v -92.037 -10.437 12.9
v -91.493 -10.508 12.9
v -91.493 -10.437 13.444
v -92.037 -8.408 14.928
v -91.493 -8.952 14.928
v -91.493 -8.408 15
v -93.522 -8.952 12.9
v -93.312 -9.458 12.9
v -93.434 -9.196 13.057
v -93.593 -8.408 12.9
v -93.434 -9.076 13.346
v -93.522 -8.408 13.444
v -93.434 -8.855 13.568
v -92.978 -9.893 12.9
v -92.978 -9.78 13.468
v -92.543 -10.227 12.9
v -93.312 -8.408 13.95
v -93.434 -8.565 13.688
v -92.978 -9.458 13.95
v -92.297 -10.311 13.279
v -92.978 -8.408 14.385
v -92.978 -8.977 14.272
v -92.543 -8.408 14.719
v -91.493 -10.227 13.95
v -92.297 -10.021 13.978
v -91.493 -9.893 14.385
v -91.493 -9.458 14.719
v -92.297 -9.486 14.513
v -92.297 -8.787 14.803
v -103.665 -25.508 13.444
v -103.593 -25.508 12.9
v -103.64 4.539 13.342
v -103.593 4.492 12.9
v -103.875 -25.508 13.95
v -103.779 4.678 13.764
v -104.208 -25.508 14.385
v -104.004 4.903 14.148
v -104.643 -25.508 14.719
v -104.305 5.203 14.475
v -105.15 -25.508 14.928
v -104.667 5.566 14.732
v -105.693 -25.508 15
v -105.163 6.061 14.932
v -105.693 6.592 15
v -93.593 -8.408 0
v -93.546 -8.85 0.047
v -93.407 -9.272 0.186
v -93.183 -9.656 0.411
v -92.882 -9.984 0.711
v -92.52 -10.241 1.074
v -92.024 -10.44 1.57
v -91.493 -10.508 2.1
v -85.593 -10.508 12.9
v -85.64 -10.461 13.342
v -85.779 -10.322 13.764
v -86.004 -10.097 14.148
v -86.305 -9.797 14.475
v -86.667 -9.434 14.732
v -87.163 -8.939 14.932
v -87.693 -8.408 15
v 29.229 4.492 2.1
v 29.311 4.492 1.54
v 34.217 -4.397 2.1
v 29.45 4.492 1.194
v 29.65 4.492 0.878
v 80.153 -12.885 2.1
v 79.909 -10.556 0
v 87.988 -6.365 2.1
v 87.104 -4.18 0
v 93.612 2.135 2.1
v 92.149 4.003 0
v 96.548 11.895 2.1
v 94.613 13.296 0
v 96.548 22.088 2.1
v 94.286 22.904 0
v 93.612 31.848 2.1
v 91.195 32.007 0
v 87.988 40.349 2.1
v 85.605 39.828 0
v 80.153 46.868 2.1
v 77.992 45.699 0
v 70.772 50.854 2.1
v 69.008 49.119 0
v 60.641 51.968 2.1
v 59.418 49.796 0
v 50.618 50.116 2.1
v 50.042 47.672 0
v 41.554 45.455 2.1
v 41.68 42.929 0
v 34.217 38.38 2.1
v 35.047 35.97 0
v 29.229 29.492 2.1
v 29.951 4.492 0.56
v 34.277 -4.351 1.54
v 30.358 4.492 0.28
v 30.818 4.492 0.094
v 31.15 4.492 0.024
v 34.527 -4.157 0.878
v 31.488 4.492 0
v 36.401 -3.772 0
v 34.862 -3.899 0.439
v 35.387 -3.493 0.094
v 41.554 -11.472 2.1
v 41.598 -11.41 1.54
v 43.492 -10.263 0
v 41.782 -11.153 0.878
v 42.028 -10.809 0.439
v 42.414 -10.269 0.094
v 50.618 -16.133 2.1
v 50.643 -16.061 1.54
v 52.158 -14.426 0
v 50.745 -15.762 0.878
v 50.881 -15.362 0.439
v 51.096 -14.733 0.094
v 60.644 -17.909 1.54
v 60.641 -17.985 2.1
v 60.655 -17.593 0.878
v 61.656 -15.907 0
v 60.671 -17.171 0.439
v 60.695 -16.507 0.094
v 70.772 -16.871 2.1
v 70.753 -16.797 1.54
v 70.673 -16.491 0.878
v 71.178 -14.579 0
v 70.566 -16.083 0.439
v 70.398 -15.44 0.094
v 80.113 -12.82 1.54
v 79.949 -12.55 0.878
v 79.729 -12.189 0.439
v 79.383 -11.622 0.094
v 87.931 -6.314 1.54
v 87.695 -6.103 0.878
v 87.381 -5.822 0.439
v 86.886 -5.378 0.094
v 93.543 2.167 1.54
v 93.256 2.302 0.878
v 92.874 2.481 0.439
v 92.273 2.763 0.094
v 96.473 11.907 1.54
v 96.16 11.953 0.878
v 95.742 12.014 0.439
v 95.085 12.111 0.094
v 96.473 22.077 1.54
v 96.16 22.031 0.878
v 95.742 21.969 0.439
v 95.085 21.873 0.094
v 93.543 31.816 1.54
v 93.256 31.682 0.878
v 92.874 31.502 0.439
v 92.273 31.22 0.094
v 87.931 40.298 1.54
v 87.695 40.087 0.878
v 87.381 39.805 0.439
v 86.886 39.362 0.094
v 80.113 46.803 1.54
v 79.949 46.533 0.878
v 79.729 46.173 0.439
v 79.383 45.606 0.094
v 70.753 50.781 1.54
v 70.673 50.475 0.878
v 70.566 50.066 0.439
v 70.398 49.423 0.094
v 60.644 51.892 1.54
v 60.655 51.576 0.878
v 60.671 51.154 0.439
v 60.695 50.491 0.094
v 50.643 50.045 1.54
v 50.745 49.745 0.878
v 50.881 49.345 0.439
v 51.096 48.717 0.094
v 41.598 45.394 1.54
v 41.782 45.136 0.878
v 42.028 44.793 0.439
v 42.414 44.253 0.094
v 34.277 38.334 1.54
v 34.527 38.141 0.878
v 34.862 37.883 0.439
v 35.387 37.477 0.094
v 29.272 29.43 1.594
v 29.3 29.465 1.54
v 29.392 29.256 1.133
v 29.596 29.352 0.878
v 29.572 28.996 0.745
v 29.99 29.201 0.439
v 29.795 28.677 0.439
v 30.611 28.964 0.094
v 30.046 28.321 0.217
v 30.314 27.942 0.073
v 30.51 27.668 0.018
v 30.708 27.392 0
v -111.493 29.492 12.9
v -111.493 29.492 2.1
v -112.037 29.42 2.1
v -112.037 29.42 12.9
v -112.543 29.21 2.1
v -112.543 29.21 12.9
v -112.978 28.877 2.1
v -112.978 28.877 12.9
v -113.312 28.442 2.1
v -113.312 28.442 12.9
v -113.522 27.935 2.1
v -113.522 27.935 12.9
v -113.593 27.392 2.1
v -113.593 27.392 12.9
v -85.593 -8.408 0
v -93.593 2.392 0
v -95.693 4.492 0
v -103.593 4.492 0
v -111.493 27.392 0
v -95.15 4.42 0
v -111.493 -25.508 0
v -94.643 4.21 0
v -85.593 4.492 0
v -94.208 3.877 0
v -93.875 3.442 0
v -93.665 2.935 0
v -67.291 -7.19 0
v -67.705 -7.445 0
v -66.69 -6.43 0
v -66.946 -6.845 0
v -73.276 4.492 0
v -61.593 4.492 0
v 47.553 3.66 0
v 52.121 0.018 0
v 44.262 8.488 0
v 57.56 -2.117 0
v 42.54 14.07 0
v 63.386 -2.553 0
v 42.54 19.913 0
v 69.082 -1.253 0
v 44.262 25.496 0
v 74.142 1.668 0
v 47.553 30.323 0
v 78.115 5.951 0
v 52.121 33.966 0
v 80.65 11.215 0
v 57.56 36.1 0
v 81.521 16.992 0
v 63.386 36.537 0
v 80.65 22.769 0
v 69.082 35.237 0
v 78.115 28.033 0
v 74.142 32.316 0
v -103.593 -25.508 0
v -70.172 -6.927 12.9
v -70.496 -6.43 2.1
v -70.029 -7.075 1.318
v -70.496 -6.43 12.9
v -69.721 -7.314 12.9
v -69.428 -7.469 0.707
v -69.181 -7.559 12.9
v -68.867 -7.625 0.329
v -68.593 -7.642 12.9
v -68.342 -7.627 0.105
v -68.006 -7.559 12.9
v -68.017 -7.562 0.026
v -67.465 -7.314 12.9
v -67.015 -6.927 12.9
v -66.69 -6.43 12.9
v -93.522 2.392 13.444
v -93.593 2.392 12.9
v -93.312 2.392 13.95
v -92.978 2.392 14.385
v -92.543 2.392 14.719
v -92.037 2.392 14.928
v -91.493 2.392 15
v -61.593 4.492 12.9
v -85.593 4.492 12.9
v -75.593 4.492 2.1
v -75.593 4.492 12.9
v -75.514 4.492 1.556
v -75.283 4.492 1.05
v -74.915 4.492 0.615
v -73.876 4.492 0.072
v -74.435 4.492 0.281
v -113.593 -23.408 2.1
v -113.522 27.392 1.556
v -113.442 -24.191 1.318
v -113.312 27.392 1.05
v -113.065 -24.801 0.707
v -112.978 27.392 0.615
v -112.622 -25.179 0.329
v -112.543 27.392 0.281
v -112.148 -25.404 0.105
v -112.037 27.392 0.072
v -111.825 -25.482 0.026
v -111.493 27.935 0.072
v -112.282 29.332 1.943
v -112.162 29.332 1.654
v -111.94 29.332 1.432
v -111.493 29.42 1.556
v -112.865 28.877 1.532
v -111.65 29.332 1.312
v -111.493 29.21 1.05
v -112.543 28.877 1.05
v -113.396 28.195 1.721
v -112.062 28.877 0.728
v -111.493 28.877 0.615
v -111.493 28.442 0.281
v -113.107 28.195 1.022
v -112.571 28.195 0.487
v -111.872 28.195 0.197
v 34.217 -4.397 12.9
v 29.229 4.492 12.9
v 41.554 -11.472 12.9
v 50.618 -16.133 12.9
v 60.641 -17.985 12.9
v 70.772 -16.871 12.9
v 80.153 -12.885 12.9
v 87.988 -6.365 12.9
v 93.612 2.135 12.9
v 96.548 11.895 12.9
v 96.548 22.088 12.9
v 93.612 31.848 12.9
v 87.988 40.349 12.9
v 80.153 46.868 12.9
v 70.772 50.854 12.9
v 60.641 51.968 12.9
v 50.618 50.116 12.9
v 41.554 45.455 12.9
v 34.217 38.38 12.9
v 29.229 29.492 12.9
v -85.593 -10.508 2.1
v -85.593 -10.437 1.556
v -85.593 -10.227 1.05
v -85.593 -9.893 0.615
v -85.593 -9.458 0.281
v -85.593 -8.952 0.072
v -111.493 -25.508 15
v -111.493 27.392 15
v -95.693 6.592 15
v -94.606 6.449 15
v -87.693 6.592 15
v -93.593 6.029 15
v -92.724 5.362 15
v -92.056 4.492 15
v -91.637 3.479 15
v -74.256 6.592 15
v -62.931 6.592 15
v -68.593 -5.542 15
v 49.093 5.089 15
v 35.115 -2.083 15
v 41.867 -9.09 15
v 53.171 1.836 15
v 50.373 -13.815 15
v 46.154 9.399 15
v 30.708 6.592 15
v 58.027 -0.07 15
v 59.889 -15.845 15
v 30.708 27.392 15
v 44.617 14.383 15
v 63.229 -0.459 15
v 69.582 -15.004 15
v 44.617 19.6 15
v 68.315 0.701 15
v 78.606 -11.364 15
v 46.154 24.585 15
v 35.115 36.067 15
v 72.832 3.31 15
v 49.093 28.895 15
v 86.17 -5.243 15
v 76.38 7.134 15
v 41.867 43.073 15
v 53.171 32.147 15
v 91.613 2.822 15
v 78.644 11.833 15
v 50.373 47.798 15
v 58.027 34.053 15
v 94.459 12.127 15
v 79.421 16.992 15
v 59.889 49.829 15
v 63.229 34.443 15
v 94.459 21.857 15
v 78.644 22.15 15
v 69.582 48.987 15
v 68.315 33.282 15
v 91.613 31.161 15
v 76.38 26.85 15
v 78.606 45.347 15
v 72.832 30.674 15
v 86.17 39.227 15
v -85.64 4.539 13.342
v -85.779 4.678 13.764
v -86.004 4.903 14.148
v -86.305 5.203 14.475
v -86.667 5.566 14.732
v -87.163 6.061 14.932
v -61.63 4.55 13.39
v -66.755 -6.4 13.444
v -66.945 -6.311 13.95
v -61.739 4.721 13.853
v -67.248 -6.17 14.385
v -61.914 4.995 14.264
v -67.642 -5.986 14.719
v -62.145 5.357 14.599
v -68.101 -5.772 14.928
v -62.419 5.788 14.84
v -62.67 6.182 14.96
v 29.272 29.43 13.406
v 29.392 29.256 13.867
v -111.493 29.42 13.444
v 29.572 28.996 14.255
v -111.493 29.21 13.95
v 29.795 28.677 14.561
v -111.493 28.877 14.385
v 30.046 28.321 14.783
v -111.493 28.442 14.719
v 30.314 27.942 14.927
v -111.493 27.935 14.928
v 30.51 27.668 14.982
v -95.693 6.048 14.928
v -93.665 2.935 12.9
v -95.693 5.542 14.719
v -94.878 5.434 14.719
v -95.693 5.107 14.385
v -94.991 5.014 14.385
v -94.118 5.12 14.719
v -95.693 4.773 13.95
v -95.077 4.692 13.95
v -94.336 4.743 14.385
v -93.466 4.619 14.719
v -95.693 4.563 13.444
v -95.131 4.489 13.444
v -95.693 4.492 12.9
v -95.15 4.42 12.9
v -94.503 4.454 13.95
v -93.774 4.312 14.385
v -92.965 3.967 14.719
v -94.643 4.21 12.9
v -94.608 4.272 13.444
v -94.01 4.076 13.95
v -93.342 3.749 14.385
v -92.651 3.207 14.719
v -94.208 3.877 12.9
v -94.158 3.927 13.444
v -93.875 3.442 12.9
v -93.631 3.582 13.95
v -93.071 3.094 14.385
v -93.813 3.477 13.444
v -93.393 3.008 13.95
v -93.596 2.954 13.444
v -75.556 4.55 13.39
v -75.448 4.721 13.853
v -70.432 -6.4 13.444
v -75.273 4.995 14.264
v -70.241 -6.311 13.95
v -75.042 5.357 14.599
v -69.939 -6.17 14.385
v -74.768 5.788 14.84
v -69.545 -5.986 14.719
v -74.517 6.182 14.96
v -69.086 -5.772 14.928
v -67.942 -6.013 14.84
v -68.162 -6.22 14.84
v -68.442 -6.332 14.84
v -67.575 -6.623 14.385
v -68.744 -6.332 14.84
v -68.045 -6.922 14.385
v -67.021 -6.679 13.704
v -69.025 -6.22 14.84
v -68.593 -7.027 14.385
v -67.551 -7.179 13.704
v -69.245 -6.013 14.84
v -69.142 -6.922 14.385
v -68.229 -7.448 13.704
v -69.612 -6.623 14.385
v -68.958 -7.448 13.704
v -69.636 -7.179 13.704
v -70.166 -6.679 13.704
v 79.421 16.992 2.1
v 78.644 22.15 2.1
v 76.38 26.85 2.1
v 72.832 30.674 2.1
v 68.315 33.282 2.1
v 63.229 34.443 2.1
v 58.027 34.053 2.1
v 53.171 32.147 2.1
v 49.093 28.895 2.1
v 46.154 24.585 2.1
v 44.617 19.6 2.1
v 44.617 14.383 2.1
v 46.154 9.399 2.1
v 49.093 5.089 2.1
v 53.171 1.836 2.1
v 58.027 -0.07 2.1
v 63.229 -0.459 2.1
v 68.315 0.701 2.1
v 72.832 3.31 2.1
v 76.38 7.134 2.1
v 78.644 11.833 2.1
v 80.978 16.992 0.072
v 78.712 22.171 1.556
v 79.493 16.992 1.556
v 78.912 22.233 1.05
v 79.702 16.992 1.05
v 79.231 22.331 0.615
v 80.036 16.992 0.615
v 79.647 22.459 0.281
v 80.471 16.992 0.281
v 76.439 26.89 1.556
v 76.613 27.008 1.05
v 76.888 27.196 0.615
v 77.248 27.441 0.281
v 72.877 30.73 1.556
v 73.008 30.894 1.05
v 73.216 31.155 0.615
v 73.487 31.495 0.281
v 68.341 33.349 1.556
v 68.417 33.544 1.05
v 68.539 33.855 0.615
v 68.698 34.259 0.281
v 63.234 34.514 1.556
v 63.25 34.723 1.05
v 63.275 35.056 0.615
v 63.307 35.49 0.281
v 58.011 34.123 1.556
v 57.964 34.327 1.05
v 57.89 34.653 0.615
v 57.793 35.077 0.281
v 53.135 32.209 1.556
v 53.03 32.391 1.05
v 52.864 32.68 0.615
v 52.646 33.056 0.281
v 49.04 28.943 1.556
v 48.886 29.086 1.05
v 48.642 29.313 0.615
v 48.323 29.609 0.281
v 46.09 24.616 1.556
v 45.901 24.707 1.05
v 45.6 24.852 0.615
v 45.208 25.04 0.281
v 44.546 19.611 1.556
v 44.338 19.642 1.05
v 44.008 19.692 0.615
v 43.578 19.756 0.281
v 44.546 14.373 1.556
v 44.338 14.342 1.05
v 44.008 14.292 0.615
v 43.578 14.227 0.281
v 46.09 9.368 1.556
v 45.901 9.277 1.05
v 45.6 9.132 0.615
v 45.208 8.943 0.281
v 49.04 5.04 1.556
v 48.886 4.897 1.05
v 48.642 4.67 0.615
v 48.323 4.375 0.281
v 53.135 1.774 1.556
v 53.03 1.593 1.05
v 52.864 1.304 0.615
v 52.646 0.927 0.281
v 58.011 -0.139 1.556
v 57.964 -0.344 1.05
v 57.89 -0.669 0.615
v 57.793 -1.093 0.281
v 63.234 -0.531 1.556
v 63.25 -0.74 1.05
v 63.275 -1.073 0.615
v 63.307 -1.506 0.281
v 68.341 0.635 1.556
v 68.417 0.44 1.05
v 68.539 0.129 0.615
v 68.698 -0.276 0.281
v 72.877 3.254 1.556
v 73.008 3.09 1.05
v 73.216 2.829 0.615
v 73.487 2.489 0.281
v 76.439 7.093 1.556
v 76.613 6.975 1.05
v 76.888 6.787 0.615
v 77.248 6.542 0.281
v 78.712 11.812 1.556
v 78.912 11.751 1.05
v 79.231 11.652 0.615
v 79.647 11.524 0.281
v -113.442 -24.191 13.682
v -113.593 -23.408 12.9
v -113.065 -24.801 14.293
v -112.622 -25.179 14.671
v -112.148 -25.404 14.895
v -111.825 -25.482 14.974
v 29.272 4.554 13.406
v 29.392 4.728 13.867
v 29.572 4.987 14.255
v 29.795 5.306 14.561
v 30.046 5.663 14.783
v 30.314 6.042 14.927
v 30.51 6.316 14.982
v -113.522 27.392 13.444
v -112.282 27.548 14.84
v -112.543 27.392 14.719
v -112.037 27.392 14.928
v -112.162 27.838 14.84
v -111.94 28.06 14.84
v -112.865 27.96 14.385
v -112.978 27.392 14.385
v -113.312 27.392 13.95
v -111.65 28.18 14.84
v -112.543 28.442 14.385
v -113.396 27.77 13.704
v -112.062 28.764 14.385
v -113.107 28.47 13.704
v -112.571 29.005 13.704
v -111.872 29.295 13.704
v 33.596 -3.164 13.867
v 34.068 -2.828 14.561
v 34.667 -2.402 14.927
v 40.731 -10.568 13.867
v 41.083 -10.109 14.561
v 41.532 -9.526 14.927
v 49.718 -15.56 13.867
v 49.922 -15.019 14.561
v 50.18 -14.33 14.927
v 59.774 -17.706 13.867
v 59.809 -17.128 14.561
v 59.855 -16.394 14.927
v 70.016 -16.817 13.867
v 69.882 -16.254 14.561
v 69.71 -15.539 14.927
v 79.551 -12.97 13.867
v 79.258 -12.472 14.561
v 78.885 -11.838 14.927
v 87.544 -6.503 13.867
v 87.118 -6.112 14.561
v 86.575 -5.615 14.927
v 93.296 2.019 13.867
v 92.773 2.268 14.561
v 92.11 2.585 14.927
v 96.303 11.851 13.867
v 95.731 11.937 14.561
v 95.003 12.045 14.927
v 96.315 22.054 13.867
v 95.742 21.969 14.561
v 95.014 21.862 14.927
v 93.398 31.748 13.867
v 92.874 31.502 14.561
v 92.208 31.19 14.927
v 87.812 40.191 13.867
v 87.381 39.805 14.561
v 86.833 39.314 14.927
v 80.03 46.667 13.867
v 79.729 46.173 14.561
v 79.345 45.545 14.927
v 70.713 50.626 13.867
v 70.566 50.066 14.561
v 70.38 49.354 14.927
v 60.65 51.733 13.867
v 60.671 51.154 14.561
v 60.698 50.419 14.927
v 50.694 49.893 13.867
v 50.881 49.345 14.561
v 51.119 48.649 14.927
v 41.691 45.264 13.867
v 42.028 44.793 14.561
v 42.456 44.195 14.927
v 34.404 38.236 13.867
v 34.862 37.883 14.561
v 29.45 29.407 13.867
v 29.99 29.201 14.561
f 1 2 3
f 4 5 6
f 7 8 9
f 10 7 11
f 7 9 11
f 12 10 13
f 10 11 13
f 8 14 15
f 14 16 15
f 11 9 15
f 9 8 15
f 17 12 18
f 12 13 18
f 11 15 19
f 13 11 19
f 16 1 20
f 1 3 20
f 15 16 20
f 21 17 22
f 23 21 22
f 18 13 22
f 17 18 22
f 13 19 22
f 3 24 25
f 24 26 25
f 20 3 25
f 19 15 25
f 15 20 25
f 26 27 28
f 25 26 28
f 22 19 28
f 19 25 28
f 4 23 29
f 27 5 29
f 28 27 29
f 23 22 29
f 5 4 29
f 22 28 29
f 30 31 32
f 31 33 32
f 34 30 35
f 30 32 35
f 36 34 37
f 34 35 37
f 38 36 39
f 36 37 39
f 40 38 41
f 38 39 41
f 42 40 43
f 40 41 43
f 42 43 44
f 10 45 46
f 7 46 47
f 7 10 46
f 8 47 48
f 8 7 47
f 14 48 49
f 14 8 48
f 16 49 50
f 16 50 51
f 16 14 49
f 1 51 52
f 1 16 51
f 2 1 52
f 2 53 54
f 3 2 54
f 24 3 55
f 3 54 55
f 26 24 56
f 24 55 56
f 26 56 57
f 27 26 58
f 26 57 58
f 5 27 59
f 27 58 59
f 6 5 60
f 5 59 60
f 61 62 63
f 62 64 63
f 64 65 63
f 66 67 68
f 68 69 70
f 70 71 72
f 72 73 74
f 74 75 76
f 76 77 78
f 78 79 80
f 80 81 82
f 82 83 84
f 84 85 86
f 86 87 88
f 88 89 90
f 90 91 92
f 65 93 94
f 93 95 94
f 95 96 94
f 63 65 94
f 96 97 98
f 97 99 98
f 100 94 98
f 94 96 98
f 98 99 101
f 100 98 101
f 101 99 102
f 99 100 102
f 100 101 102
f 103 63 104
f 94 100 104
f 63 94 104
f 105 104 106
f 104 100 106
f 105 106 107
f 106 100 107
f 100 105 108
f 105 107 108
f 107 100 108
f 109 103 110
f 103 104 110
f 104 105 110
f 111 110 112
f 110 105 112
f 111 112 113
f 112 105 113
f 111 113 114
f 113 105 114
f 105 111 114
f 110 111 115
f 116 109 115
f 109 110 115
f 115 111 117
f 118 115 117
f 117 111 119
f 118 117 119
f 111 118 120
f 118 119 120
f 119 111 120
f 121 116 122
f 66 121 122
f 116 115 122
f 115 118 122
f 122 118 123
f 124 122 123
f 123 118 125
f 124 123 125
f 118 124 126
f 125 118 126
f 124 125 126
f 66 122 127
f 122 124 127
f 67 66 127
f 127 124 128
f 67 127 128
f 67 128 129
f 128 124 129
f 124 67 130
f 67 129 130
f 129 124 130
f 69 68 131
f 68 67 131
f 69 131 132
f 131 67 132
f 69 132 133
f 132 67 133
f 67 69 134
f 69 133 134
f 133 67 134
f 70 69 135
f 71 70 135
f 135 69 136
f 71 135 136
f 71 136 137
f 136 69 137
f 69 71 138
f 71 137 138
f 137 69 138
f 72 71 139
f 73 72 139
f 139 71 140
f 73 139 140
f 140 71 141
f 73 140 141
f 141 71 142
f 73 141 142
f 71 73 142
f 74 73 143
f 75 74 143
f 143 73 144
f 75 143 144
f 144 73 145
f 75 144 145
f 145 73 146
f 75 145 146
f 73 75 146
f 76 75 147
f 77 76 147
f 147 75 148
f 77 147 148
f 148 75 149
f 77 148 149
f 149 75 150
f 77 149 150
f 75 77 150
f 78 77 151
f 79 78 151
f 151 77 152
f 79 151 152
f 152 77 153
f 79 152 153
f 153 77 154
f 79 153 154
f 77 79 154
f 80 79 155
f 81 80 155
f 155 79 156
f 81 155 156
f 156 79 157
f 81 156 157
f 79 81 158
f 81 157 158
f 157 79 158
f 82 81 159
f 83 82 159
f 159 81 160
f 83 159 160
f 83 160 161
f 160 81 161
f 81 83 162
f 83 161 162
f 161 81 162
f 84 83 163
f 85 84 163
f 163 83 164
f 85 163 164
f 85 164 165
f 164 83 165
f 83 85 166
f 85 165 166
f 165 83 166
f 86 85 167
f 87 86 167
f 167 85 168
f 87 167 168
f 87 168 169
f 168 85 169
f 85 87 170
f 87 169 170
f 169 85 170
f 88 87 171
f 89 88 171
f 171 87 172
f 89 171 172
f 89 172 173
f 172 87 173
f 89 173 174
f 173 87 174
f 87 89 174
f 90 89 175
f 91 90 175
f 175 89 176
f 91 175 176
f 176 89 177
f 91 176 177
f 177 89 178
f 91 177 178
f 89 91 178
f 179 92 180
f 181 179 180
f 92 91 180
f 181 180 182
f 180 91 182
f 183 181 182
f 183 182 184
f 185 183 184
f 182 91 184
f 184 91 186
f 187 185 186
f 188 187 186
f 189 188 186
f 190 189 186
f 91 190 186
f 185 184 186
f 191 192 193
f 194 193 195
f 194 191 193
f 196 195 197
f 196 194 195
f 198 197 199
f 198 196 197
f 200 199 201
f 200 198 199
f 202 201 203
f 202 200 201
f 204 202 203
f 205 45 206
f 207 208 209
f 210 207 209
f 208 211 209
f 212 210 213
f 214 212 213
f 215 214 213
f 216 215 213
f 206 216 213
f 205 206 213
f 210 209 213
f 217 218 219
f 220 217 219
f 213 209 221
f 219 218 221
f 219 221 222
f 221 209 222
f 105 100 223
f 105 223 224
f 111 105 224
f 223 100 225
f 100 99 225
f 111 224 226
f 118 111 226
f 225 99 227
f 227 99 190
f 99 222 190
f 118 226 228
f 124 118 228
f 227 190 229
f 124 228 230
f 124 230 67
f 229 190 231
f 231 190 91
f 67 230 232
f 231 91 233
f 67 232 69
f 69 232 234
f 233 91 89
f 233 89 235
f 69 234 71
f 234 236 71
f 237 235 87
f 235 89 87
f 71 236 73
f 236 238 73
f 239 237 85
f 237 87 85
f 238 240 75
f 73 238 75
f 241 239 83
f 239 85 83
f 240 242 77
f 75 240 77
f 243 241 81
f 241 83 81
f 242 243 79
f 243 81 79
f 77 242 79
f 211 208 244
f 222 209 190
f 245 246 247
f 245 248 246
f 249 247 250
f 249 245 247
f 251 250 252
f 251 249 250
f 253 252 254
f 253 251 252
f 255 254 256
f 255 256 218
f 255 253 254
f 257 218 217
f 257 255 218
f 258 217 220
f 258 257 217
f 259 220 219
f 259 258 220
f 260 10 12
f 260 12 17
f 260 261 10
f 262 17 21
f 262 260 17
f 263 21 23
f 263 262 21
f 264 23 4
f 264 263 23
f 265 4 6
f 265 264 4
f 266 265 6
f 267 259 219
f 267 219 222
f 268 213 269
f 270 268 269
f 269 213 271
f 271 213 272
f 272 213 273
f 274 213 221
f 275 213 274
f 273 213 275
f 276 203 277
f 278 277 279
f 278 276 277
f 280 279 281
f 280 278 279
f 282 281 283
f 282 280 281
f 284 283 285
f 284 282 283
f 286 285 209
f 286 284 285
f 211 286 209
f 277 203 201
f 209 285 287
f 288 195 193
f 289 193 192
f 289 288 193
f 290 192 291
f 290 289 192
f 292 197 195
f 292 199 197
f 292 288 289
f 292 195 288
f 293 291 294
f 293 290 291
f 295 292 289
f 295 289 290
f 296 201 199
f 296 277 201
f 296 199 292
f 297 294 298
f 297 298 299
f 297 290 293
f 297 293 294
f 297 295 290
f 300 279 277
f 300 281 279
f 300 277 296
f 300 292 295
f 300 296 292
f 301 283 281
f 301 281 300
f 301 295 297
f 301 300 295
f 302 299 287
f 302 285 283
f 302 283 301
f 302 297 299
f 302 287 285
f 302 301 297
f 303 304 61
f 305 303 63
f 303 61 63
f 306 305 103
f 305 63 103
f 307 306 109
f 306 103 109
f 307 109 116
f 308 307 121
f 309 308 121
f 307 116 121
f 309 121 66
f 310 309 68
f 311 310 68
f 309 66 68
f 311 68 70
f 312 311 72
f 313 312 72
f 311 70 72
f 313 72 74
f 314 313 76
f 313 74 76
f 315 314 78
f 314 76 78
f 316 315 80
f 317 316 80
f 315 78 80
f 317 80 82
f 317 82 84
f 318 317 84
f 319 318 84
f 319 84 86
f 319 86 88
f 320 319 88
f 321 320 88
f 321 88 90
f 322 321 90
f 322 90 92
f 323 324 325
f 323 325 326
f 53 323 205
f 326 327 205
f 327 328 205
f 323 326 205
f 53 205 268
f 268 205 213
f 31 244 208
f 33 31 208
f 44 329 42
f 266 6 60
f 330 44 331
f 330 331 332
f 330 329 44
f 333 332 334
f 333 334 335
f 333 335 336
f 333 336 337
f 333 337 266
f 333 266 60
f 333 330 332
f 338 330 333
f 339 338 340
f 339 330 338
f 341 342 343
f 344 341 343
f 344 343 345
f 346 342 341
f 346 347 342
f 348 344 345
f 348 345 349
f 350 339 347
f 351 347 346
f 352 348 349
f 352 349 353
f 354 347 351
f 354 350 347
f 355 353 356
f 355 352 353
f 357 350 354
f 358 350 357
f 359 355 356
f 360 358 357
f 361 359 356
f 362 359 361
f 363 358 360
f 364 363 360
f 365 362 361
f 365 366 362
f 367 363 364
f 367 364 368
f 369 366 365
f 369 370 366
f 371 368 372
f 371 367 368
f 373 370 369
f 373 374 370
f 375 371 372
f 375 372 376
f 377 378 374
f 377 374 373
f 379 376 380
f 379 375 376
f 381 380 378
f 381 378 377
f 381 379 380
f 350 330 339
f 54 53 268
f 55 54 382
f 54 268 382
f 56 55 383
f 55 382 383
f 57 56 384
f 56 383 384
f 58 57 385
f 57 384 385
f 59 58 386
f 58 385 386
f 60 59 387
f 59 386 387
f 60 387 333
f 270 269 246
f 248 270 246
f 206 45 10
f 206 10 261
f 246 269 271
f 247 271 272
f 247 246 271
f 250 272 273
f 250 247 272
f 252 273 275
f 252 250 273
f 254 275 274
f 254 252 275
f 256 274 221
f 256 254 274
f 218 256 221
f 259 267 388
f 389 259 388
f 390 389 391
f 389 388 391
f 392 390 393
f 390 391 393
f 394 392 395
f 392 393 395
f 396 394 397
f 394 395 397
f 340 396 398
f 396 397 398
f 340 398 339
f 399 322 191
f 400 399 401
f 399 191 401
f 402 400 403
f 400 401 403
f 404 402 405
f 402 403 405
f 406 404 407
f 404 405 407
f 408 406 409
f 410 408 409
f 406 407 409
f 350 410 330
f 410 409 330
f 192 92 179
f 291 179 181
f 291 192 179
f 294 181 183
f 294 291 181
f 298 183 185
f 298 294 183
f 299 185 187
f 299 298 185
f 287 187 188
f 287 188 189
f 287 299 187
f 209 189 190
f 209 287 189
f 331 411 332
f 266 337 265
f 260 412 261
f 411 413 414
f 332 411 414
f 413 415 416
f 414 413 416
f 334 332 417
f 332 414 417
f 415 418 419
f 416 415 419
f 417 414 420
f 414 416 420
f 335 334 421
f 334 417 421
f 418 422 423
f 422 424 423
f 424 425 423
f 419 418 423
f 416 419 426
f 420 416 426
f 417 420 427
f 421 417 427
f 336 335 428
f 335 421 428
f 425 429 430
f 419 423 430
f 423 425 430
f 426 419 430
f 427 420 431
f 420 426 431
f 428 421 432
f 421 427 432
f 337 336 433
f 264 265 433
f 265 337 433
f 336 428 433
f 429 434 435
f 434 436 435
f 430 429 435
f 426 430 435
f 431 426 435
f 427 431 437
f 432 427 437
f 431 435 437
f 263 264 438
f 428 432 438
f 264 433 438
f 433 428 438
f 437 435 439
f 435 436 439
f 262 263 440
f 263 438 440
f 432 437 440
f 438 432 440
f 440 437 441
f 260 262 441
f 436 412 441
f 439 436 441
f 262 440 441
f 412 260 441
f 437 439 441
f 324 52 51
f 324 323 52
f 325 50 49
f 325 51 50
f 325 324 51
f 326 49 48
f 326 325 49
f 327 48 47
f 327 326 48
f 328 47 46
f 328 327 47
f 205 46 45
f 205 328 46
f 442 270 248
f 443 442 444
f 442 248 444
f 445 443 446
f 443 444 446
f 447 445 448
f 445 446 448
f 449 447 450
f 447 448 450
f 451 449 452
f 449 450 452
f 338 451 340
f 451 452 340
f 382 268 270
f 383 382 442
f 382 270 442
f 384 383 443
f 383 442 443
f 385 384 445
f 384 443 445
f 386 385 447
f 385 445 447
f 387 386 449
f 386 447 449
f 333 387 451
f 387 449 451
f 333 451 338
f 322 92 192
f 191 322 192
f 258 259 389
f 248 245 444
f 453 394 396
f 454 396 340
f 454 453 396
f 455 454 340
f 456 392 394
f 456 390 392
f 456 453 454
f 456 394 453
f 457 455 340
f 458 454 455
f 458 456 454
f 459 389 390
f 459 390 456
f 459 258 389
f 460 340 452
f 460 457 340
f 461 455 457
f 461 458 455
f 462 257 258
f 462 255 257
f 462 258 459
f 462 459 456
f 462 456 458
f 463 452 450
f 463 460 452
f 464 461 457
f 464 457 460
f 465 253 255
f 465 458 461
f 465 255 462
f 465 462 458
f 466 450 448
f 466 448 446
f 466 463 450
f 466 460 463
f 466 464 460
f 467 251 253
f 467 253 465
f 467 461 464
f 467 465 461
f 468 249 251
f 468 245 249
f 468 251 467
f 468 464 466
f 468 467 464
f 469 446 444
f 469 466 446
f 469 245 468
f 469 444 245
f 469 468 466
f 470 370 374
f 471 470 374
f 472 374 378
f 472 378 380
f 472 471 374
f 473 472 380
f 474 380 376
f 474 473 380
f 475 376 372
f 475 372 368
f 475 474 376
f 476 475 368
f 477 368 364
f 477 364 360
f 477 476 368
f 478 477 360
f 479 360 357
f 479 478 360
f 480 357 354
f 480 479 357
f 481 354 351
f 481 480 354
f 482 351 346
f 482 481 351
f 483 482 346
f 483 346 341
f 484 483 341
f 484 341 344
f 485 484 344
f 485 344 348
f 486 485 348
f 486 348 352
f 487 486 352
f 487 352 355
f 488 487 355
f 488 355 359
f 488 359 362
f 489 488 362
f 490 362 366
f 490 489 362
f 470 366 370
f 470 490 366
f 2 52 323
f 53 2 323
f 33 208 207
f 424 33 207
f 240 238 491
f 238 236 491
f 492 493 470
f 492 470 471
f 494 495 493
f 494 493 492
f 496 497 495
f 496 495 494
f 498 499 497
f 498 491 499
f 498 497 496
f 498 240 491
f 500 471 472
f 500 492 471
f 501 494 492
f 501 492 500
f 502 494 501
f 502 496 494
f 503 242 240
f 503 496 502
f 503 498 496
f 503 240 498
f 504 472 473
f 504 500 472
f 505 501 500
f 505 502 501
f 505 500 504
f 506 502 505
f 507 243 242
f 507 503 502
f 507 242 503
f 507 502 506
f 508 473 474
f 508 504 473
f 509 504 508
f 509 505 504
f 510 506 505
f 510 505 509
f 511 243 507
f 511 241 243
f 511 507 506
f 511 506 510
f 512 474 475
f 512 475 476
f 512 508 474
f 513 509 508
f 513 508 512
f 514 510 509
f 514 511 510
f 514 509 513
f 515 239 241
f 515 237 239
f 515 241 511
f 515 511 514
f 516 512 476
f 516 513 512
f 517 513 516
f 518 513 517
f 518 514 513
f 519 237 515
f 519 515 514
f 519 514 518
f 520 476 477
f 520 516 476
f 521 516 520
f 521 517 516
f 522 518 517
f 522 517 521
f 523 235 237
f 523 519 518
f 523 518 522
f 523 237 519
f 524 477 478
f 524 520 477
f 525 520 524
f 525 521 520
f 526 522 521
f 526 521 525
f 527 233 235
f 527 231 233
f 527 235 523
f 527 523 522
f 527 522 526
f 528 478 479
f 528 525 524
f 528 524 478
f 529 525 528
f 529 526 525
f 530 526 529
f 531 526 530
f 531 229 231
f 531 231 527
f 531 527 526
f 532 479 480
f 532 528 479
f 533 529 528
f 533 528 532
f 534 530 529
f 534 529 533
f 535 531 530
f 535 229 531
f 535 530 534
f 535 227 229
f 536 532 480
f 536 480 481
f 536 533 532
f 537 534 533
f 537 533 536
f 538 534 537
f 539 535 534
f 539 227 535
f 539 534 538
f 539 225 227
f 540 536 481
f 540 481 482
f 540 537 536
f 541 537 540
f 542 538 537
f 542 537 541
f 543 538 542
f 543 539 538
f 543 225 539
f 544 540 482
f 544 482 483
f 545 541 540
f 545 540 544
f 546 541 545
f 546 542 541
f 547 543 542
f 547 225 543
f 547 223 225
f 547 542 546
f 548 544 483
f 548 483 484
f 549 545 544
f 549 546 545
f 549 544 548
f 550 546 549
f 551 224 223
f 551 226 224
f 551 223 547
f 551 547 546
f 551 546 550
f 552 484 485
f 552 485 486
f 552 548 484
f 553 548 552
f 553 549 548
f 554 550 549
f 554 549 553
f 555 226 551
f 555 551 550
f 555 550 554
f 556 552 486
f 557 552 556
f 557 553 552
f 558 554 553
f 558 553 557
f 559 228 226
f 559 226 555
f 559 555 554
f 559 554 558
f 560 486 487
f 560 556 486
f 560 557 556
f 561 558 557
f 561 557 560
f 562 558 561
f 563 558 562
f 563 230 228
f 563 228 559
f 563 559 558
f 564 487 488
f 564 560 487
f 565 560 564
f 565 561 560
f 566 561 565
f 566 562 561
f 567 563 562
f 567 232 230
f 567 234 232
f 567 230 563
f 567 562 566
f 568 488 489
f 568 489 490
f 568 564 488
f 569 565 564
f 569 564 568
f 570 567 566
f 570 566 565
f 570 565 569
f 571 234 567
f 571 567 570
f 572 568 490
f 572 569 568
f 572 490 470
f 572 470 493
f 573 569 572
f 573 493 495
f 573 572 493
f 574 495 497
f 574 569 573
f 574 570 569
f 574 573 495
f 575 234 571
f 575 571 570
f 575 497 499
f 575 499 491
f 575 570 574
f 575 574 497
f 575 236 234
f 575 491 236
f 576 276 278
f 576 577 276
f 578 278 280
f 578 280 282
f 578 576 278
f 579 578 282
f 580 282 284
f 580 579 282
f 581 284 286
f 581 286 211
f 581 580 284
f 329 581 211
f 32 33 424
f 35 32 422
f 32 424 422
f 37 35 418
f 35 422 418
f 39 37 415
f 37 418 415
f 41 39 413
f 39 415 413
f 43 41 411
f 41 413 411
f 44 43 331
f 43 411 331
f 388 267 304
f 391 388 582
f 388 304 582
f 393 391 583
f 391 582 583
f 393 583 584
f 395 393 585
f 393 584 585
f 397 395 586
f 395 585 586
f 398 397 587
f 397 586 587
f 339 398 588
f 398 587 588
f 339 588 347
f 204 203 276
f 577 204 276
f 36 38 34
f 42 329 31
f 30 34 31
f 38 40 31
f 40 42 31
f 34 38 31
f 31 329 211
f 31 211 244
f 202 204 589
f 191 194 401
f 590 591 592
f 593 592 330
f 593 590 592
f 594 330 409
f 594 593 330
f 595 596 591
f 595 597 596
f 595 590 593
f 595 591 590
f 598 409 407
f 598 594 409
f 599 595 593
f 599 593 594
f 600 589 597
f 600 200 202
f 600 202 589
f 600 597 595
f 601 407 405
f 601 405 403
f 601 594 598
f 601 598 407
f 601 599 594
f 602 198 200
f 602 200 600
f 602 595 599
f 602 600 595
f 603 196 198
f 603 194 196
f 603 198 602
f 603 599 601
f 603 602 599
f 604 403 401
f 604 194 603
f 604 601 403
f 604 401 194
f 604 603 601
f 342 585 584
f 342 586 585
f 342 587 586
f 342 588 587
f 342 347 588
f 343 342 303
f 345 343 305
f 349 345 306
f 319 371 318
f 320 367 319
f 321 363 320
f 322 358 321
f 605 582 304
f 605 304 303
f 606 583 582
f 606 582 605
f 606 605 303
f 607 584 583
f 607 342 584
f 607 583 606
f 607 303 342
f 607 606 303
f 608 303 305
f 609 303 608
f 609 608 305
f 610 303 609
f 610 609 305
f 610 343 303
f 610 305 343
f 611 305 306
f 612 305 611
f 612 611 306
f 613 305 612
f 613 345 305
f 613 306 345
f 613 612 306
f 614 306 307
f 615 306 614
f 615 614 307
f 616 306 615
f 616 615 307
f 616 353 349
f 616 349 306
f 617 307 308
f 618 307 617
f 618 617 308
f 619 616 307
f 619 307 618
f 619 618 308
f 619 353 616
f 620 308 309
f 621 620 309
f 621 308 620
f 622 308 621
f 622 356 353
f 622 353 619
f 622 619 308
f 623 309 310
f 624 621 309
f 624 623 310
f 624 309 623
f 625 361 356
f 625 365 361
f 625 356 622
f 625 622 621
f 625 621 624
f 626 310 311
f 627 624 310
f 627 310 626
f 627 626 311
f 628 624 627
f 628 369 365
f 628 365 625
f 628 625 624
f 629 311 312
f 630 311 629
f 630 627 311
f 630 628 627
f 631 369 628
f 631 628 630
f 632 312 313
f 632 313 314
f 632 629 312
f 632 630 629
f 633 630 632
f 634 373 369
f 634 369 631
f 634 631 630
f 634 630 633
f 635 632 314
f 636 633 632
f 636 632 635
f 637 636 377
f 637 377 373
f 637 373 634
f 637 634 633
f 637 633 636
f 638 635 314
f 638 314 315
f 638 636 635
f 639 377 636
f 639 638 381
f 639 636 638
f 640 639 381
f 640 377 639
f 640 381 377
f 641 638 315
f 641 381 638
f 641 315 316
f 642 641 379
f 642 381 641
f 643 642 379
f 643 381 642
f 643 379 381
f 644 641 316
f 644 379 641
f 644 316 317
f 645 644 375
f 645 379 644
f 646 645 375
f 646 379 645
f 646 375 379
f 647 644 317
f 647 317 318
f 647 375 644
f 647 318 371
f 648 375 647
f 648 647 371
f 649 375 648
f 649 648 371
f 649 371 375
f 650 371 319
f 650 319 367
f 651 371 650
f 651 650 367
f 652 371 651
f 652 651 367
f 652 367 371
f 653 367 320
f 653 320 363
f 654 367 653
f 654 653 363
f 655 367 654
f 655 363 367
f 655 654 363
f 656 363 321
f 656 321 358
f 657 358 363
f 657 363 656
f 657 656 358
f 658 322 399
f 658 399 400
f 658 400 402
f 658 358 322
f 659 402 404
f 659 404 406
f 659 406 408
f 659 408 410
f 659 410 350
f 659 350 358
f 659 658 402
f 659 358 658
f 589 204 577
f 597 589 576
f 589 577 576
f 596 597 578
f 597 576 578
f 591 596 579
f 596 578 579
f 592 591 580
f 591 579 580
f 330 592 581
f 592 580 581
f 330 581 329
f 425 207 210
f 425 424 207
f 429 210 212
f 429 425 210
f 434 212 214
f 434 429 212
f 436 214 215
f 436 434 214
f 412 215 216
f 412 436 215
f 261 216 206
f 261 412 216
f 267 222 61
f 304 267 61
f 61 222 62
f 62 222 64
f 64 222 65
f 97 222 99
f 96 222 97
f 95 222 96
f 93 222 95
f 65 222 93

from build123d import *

# Parameters (mm, degrees)
F0_R     = 17.5
F0_W     = 10
F0_H     = 30
F0_W_2   = 8
F0_H_2   = 15
F1_DEPTH = 15
F2_R     = 2.1


with BuildPart() as f1:
    # F0 (on Top) → F1 (new body)
    with BuildSketch(Plane.XY):
        Polygon((29.2293787445, 29.4917059159), (-113.5933991075, 29.4917059159), (-113.5933991075, 4.4917059159), (-103.5933991075, 4.4917059159), (-93.5933991075, 4.4917059159), (-85.5933991075, 4.4917059159), (-75.5933991075, 4.4917059159), (-61.5933991075, 4.4917059159), (29.2293787445, 4.4917059159), align=None)
        with BuildLine():
            ThreePointArc((29.2293787445, 4.4917059159), (96.9211208211, 16.9917059159), (29.2293787445, 29.4917059159))
            Line((29.2293787445, 29.4917059159), (29.2293787445, 4.4917059159))
        make_face()
        with Locations((61.9211208211, 16.9917059159)):
            Circle(F0_R, mode=Mode.SUBTRACT)
        with Locations((-108.5933991075, -10.5082940841)):
            Rectangle(F0_W, F0_H)
        Polygon((-68.5933991075, -10.5082940841), (-61.5933991075, 4.4917059159), (-75.5933991075, 4.4917059159), align=None)
        with Locations((-89.5933991075, -3.0082940841)):
            Rectangle(F0_W_2, F0_H_2)
    extrude(amount=F1_DEPTH)

    # F2
    f2_edges = [f1.edges().sort_by_distance(p)[0] for p in [
        (-113.593399, 1.991706, 0),
        (-113.593399, 29.491706, 7.5),
        (-113.593399, 1.991706, 15),
        (-113.593399, -25.508294, 7.5),
        (-42.18201, 29.491706, 0),
        (-16.18201, 4.491706, 15),
        (-42.18201, 29.491706, 15),
        (96.921121, 16.991706, 15),
        (96.921121, 16.991706, 0),
        (-65.093399, -3.008294, 15),
        (-85.593399, -3.008294, 15),
        (-80.593399, 4.491706, 15),
        (-72.093399, -3.008294, 15),
        (-89.593399, -10.508294, 15),
        (-93.593399, 4.491706, 7.5),
        (-103.593399, -10.508294, 15),
        (-93.593399, -10.508294, 7.5),
        (-89.593399, -10.508294, 0),
        (-72.093399, -3.008294, 0),
        (-68.593399, -10.508294, 7.5),
        (-98.593399, 4.491706, 15),
        (44.421121, 16.991706, 0),
        (-93.593399, -3.008294, 15),
    ]]
    fillet(f2_edges, radius=F2_R)


solid = f1.part
